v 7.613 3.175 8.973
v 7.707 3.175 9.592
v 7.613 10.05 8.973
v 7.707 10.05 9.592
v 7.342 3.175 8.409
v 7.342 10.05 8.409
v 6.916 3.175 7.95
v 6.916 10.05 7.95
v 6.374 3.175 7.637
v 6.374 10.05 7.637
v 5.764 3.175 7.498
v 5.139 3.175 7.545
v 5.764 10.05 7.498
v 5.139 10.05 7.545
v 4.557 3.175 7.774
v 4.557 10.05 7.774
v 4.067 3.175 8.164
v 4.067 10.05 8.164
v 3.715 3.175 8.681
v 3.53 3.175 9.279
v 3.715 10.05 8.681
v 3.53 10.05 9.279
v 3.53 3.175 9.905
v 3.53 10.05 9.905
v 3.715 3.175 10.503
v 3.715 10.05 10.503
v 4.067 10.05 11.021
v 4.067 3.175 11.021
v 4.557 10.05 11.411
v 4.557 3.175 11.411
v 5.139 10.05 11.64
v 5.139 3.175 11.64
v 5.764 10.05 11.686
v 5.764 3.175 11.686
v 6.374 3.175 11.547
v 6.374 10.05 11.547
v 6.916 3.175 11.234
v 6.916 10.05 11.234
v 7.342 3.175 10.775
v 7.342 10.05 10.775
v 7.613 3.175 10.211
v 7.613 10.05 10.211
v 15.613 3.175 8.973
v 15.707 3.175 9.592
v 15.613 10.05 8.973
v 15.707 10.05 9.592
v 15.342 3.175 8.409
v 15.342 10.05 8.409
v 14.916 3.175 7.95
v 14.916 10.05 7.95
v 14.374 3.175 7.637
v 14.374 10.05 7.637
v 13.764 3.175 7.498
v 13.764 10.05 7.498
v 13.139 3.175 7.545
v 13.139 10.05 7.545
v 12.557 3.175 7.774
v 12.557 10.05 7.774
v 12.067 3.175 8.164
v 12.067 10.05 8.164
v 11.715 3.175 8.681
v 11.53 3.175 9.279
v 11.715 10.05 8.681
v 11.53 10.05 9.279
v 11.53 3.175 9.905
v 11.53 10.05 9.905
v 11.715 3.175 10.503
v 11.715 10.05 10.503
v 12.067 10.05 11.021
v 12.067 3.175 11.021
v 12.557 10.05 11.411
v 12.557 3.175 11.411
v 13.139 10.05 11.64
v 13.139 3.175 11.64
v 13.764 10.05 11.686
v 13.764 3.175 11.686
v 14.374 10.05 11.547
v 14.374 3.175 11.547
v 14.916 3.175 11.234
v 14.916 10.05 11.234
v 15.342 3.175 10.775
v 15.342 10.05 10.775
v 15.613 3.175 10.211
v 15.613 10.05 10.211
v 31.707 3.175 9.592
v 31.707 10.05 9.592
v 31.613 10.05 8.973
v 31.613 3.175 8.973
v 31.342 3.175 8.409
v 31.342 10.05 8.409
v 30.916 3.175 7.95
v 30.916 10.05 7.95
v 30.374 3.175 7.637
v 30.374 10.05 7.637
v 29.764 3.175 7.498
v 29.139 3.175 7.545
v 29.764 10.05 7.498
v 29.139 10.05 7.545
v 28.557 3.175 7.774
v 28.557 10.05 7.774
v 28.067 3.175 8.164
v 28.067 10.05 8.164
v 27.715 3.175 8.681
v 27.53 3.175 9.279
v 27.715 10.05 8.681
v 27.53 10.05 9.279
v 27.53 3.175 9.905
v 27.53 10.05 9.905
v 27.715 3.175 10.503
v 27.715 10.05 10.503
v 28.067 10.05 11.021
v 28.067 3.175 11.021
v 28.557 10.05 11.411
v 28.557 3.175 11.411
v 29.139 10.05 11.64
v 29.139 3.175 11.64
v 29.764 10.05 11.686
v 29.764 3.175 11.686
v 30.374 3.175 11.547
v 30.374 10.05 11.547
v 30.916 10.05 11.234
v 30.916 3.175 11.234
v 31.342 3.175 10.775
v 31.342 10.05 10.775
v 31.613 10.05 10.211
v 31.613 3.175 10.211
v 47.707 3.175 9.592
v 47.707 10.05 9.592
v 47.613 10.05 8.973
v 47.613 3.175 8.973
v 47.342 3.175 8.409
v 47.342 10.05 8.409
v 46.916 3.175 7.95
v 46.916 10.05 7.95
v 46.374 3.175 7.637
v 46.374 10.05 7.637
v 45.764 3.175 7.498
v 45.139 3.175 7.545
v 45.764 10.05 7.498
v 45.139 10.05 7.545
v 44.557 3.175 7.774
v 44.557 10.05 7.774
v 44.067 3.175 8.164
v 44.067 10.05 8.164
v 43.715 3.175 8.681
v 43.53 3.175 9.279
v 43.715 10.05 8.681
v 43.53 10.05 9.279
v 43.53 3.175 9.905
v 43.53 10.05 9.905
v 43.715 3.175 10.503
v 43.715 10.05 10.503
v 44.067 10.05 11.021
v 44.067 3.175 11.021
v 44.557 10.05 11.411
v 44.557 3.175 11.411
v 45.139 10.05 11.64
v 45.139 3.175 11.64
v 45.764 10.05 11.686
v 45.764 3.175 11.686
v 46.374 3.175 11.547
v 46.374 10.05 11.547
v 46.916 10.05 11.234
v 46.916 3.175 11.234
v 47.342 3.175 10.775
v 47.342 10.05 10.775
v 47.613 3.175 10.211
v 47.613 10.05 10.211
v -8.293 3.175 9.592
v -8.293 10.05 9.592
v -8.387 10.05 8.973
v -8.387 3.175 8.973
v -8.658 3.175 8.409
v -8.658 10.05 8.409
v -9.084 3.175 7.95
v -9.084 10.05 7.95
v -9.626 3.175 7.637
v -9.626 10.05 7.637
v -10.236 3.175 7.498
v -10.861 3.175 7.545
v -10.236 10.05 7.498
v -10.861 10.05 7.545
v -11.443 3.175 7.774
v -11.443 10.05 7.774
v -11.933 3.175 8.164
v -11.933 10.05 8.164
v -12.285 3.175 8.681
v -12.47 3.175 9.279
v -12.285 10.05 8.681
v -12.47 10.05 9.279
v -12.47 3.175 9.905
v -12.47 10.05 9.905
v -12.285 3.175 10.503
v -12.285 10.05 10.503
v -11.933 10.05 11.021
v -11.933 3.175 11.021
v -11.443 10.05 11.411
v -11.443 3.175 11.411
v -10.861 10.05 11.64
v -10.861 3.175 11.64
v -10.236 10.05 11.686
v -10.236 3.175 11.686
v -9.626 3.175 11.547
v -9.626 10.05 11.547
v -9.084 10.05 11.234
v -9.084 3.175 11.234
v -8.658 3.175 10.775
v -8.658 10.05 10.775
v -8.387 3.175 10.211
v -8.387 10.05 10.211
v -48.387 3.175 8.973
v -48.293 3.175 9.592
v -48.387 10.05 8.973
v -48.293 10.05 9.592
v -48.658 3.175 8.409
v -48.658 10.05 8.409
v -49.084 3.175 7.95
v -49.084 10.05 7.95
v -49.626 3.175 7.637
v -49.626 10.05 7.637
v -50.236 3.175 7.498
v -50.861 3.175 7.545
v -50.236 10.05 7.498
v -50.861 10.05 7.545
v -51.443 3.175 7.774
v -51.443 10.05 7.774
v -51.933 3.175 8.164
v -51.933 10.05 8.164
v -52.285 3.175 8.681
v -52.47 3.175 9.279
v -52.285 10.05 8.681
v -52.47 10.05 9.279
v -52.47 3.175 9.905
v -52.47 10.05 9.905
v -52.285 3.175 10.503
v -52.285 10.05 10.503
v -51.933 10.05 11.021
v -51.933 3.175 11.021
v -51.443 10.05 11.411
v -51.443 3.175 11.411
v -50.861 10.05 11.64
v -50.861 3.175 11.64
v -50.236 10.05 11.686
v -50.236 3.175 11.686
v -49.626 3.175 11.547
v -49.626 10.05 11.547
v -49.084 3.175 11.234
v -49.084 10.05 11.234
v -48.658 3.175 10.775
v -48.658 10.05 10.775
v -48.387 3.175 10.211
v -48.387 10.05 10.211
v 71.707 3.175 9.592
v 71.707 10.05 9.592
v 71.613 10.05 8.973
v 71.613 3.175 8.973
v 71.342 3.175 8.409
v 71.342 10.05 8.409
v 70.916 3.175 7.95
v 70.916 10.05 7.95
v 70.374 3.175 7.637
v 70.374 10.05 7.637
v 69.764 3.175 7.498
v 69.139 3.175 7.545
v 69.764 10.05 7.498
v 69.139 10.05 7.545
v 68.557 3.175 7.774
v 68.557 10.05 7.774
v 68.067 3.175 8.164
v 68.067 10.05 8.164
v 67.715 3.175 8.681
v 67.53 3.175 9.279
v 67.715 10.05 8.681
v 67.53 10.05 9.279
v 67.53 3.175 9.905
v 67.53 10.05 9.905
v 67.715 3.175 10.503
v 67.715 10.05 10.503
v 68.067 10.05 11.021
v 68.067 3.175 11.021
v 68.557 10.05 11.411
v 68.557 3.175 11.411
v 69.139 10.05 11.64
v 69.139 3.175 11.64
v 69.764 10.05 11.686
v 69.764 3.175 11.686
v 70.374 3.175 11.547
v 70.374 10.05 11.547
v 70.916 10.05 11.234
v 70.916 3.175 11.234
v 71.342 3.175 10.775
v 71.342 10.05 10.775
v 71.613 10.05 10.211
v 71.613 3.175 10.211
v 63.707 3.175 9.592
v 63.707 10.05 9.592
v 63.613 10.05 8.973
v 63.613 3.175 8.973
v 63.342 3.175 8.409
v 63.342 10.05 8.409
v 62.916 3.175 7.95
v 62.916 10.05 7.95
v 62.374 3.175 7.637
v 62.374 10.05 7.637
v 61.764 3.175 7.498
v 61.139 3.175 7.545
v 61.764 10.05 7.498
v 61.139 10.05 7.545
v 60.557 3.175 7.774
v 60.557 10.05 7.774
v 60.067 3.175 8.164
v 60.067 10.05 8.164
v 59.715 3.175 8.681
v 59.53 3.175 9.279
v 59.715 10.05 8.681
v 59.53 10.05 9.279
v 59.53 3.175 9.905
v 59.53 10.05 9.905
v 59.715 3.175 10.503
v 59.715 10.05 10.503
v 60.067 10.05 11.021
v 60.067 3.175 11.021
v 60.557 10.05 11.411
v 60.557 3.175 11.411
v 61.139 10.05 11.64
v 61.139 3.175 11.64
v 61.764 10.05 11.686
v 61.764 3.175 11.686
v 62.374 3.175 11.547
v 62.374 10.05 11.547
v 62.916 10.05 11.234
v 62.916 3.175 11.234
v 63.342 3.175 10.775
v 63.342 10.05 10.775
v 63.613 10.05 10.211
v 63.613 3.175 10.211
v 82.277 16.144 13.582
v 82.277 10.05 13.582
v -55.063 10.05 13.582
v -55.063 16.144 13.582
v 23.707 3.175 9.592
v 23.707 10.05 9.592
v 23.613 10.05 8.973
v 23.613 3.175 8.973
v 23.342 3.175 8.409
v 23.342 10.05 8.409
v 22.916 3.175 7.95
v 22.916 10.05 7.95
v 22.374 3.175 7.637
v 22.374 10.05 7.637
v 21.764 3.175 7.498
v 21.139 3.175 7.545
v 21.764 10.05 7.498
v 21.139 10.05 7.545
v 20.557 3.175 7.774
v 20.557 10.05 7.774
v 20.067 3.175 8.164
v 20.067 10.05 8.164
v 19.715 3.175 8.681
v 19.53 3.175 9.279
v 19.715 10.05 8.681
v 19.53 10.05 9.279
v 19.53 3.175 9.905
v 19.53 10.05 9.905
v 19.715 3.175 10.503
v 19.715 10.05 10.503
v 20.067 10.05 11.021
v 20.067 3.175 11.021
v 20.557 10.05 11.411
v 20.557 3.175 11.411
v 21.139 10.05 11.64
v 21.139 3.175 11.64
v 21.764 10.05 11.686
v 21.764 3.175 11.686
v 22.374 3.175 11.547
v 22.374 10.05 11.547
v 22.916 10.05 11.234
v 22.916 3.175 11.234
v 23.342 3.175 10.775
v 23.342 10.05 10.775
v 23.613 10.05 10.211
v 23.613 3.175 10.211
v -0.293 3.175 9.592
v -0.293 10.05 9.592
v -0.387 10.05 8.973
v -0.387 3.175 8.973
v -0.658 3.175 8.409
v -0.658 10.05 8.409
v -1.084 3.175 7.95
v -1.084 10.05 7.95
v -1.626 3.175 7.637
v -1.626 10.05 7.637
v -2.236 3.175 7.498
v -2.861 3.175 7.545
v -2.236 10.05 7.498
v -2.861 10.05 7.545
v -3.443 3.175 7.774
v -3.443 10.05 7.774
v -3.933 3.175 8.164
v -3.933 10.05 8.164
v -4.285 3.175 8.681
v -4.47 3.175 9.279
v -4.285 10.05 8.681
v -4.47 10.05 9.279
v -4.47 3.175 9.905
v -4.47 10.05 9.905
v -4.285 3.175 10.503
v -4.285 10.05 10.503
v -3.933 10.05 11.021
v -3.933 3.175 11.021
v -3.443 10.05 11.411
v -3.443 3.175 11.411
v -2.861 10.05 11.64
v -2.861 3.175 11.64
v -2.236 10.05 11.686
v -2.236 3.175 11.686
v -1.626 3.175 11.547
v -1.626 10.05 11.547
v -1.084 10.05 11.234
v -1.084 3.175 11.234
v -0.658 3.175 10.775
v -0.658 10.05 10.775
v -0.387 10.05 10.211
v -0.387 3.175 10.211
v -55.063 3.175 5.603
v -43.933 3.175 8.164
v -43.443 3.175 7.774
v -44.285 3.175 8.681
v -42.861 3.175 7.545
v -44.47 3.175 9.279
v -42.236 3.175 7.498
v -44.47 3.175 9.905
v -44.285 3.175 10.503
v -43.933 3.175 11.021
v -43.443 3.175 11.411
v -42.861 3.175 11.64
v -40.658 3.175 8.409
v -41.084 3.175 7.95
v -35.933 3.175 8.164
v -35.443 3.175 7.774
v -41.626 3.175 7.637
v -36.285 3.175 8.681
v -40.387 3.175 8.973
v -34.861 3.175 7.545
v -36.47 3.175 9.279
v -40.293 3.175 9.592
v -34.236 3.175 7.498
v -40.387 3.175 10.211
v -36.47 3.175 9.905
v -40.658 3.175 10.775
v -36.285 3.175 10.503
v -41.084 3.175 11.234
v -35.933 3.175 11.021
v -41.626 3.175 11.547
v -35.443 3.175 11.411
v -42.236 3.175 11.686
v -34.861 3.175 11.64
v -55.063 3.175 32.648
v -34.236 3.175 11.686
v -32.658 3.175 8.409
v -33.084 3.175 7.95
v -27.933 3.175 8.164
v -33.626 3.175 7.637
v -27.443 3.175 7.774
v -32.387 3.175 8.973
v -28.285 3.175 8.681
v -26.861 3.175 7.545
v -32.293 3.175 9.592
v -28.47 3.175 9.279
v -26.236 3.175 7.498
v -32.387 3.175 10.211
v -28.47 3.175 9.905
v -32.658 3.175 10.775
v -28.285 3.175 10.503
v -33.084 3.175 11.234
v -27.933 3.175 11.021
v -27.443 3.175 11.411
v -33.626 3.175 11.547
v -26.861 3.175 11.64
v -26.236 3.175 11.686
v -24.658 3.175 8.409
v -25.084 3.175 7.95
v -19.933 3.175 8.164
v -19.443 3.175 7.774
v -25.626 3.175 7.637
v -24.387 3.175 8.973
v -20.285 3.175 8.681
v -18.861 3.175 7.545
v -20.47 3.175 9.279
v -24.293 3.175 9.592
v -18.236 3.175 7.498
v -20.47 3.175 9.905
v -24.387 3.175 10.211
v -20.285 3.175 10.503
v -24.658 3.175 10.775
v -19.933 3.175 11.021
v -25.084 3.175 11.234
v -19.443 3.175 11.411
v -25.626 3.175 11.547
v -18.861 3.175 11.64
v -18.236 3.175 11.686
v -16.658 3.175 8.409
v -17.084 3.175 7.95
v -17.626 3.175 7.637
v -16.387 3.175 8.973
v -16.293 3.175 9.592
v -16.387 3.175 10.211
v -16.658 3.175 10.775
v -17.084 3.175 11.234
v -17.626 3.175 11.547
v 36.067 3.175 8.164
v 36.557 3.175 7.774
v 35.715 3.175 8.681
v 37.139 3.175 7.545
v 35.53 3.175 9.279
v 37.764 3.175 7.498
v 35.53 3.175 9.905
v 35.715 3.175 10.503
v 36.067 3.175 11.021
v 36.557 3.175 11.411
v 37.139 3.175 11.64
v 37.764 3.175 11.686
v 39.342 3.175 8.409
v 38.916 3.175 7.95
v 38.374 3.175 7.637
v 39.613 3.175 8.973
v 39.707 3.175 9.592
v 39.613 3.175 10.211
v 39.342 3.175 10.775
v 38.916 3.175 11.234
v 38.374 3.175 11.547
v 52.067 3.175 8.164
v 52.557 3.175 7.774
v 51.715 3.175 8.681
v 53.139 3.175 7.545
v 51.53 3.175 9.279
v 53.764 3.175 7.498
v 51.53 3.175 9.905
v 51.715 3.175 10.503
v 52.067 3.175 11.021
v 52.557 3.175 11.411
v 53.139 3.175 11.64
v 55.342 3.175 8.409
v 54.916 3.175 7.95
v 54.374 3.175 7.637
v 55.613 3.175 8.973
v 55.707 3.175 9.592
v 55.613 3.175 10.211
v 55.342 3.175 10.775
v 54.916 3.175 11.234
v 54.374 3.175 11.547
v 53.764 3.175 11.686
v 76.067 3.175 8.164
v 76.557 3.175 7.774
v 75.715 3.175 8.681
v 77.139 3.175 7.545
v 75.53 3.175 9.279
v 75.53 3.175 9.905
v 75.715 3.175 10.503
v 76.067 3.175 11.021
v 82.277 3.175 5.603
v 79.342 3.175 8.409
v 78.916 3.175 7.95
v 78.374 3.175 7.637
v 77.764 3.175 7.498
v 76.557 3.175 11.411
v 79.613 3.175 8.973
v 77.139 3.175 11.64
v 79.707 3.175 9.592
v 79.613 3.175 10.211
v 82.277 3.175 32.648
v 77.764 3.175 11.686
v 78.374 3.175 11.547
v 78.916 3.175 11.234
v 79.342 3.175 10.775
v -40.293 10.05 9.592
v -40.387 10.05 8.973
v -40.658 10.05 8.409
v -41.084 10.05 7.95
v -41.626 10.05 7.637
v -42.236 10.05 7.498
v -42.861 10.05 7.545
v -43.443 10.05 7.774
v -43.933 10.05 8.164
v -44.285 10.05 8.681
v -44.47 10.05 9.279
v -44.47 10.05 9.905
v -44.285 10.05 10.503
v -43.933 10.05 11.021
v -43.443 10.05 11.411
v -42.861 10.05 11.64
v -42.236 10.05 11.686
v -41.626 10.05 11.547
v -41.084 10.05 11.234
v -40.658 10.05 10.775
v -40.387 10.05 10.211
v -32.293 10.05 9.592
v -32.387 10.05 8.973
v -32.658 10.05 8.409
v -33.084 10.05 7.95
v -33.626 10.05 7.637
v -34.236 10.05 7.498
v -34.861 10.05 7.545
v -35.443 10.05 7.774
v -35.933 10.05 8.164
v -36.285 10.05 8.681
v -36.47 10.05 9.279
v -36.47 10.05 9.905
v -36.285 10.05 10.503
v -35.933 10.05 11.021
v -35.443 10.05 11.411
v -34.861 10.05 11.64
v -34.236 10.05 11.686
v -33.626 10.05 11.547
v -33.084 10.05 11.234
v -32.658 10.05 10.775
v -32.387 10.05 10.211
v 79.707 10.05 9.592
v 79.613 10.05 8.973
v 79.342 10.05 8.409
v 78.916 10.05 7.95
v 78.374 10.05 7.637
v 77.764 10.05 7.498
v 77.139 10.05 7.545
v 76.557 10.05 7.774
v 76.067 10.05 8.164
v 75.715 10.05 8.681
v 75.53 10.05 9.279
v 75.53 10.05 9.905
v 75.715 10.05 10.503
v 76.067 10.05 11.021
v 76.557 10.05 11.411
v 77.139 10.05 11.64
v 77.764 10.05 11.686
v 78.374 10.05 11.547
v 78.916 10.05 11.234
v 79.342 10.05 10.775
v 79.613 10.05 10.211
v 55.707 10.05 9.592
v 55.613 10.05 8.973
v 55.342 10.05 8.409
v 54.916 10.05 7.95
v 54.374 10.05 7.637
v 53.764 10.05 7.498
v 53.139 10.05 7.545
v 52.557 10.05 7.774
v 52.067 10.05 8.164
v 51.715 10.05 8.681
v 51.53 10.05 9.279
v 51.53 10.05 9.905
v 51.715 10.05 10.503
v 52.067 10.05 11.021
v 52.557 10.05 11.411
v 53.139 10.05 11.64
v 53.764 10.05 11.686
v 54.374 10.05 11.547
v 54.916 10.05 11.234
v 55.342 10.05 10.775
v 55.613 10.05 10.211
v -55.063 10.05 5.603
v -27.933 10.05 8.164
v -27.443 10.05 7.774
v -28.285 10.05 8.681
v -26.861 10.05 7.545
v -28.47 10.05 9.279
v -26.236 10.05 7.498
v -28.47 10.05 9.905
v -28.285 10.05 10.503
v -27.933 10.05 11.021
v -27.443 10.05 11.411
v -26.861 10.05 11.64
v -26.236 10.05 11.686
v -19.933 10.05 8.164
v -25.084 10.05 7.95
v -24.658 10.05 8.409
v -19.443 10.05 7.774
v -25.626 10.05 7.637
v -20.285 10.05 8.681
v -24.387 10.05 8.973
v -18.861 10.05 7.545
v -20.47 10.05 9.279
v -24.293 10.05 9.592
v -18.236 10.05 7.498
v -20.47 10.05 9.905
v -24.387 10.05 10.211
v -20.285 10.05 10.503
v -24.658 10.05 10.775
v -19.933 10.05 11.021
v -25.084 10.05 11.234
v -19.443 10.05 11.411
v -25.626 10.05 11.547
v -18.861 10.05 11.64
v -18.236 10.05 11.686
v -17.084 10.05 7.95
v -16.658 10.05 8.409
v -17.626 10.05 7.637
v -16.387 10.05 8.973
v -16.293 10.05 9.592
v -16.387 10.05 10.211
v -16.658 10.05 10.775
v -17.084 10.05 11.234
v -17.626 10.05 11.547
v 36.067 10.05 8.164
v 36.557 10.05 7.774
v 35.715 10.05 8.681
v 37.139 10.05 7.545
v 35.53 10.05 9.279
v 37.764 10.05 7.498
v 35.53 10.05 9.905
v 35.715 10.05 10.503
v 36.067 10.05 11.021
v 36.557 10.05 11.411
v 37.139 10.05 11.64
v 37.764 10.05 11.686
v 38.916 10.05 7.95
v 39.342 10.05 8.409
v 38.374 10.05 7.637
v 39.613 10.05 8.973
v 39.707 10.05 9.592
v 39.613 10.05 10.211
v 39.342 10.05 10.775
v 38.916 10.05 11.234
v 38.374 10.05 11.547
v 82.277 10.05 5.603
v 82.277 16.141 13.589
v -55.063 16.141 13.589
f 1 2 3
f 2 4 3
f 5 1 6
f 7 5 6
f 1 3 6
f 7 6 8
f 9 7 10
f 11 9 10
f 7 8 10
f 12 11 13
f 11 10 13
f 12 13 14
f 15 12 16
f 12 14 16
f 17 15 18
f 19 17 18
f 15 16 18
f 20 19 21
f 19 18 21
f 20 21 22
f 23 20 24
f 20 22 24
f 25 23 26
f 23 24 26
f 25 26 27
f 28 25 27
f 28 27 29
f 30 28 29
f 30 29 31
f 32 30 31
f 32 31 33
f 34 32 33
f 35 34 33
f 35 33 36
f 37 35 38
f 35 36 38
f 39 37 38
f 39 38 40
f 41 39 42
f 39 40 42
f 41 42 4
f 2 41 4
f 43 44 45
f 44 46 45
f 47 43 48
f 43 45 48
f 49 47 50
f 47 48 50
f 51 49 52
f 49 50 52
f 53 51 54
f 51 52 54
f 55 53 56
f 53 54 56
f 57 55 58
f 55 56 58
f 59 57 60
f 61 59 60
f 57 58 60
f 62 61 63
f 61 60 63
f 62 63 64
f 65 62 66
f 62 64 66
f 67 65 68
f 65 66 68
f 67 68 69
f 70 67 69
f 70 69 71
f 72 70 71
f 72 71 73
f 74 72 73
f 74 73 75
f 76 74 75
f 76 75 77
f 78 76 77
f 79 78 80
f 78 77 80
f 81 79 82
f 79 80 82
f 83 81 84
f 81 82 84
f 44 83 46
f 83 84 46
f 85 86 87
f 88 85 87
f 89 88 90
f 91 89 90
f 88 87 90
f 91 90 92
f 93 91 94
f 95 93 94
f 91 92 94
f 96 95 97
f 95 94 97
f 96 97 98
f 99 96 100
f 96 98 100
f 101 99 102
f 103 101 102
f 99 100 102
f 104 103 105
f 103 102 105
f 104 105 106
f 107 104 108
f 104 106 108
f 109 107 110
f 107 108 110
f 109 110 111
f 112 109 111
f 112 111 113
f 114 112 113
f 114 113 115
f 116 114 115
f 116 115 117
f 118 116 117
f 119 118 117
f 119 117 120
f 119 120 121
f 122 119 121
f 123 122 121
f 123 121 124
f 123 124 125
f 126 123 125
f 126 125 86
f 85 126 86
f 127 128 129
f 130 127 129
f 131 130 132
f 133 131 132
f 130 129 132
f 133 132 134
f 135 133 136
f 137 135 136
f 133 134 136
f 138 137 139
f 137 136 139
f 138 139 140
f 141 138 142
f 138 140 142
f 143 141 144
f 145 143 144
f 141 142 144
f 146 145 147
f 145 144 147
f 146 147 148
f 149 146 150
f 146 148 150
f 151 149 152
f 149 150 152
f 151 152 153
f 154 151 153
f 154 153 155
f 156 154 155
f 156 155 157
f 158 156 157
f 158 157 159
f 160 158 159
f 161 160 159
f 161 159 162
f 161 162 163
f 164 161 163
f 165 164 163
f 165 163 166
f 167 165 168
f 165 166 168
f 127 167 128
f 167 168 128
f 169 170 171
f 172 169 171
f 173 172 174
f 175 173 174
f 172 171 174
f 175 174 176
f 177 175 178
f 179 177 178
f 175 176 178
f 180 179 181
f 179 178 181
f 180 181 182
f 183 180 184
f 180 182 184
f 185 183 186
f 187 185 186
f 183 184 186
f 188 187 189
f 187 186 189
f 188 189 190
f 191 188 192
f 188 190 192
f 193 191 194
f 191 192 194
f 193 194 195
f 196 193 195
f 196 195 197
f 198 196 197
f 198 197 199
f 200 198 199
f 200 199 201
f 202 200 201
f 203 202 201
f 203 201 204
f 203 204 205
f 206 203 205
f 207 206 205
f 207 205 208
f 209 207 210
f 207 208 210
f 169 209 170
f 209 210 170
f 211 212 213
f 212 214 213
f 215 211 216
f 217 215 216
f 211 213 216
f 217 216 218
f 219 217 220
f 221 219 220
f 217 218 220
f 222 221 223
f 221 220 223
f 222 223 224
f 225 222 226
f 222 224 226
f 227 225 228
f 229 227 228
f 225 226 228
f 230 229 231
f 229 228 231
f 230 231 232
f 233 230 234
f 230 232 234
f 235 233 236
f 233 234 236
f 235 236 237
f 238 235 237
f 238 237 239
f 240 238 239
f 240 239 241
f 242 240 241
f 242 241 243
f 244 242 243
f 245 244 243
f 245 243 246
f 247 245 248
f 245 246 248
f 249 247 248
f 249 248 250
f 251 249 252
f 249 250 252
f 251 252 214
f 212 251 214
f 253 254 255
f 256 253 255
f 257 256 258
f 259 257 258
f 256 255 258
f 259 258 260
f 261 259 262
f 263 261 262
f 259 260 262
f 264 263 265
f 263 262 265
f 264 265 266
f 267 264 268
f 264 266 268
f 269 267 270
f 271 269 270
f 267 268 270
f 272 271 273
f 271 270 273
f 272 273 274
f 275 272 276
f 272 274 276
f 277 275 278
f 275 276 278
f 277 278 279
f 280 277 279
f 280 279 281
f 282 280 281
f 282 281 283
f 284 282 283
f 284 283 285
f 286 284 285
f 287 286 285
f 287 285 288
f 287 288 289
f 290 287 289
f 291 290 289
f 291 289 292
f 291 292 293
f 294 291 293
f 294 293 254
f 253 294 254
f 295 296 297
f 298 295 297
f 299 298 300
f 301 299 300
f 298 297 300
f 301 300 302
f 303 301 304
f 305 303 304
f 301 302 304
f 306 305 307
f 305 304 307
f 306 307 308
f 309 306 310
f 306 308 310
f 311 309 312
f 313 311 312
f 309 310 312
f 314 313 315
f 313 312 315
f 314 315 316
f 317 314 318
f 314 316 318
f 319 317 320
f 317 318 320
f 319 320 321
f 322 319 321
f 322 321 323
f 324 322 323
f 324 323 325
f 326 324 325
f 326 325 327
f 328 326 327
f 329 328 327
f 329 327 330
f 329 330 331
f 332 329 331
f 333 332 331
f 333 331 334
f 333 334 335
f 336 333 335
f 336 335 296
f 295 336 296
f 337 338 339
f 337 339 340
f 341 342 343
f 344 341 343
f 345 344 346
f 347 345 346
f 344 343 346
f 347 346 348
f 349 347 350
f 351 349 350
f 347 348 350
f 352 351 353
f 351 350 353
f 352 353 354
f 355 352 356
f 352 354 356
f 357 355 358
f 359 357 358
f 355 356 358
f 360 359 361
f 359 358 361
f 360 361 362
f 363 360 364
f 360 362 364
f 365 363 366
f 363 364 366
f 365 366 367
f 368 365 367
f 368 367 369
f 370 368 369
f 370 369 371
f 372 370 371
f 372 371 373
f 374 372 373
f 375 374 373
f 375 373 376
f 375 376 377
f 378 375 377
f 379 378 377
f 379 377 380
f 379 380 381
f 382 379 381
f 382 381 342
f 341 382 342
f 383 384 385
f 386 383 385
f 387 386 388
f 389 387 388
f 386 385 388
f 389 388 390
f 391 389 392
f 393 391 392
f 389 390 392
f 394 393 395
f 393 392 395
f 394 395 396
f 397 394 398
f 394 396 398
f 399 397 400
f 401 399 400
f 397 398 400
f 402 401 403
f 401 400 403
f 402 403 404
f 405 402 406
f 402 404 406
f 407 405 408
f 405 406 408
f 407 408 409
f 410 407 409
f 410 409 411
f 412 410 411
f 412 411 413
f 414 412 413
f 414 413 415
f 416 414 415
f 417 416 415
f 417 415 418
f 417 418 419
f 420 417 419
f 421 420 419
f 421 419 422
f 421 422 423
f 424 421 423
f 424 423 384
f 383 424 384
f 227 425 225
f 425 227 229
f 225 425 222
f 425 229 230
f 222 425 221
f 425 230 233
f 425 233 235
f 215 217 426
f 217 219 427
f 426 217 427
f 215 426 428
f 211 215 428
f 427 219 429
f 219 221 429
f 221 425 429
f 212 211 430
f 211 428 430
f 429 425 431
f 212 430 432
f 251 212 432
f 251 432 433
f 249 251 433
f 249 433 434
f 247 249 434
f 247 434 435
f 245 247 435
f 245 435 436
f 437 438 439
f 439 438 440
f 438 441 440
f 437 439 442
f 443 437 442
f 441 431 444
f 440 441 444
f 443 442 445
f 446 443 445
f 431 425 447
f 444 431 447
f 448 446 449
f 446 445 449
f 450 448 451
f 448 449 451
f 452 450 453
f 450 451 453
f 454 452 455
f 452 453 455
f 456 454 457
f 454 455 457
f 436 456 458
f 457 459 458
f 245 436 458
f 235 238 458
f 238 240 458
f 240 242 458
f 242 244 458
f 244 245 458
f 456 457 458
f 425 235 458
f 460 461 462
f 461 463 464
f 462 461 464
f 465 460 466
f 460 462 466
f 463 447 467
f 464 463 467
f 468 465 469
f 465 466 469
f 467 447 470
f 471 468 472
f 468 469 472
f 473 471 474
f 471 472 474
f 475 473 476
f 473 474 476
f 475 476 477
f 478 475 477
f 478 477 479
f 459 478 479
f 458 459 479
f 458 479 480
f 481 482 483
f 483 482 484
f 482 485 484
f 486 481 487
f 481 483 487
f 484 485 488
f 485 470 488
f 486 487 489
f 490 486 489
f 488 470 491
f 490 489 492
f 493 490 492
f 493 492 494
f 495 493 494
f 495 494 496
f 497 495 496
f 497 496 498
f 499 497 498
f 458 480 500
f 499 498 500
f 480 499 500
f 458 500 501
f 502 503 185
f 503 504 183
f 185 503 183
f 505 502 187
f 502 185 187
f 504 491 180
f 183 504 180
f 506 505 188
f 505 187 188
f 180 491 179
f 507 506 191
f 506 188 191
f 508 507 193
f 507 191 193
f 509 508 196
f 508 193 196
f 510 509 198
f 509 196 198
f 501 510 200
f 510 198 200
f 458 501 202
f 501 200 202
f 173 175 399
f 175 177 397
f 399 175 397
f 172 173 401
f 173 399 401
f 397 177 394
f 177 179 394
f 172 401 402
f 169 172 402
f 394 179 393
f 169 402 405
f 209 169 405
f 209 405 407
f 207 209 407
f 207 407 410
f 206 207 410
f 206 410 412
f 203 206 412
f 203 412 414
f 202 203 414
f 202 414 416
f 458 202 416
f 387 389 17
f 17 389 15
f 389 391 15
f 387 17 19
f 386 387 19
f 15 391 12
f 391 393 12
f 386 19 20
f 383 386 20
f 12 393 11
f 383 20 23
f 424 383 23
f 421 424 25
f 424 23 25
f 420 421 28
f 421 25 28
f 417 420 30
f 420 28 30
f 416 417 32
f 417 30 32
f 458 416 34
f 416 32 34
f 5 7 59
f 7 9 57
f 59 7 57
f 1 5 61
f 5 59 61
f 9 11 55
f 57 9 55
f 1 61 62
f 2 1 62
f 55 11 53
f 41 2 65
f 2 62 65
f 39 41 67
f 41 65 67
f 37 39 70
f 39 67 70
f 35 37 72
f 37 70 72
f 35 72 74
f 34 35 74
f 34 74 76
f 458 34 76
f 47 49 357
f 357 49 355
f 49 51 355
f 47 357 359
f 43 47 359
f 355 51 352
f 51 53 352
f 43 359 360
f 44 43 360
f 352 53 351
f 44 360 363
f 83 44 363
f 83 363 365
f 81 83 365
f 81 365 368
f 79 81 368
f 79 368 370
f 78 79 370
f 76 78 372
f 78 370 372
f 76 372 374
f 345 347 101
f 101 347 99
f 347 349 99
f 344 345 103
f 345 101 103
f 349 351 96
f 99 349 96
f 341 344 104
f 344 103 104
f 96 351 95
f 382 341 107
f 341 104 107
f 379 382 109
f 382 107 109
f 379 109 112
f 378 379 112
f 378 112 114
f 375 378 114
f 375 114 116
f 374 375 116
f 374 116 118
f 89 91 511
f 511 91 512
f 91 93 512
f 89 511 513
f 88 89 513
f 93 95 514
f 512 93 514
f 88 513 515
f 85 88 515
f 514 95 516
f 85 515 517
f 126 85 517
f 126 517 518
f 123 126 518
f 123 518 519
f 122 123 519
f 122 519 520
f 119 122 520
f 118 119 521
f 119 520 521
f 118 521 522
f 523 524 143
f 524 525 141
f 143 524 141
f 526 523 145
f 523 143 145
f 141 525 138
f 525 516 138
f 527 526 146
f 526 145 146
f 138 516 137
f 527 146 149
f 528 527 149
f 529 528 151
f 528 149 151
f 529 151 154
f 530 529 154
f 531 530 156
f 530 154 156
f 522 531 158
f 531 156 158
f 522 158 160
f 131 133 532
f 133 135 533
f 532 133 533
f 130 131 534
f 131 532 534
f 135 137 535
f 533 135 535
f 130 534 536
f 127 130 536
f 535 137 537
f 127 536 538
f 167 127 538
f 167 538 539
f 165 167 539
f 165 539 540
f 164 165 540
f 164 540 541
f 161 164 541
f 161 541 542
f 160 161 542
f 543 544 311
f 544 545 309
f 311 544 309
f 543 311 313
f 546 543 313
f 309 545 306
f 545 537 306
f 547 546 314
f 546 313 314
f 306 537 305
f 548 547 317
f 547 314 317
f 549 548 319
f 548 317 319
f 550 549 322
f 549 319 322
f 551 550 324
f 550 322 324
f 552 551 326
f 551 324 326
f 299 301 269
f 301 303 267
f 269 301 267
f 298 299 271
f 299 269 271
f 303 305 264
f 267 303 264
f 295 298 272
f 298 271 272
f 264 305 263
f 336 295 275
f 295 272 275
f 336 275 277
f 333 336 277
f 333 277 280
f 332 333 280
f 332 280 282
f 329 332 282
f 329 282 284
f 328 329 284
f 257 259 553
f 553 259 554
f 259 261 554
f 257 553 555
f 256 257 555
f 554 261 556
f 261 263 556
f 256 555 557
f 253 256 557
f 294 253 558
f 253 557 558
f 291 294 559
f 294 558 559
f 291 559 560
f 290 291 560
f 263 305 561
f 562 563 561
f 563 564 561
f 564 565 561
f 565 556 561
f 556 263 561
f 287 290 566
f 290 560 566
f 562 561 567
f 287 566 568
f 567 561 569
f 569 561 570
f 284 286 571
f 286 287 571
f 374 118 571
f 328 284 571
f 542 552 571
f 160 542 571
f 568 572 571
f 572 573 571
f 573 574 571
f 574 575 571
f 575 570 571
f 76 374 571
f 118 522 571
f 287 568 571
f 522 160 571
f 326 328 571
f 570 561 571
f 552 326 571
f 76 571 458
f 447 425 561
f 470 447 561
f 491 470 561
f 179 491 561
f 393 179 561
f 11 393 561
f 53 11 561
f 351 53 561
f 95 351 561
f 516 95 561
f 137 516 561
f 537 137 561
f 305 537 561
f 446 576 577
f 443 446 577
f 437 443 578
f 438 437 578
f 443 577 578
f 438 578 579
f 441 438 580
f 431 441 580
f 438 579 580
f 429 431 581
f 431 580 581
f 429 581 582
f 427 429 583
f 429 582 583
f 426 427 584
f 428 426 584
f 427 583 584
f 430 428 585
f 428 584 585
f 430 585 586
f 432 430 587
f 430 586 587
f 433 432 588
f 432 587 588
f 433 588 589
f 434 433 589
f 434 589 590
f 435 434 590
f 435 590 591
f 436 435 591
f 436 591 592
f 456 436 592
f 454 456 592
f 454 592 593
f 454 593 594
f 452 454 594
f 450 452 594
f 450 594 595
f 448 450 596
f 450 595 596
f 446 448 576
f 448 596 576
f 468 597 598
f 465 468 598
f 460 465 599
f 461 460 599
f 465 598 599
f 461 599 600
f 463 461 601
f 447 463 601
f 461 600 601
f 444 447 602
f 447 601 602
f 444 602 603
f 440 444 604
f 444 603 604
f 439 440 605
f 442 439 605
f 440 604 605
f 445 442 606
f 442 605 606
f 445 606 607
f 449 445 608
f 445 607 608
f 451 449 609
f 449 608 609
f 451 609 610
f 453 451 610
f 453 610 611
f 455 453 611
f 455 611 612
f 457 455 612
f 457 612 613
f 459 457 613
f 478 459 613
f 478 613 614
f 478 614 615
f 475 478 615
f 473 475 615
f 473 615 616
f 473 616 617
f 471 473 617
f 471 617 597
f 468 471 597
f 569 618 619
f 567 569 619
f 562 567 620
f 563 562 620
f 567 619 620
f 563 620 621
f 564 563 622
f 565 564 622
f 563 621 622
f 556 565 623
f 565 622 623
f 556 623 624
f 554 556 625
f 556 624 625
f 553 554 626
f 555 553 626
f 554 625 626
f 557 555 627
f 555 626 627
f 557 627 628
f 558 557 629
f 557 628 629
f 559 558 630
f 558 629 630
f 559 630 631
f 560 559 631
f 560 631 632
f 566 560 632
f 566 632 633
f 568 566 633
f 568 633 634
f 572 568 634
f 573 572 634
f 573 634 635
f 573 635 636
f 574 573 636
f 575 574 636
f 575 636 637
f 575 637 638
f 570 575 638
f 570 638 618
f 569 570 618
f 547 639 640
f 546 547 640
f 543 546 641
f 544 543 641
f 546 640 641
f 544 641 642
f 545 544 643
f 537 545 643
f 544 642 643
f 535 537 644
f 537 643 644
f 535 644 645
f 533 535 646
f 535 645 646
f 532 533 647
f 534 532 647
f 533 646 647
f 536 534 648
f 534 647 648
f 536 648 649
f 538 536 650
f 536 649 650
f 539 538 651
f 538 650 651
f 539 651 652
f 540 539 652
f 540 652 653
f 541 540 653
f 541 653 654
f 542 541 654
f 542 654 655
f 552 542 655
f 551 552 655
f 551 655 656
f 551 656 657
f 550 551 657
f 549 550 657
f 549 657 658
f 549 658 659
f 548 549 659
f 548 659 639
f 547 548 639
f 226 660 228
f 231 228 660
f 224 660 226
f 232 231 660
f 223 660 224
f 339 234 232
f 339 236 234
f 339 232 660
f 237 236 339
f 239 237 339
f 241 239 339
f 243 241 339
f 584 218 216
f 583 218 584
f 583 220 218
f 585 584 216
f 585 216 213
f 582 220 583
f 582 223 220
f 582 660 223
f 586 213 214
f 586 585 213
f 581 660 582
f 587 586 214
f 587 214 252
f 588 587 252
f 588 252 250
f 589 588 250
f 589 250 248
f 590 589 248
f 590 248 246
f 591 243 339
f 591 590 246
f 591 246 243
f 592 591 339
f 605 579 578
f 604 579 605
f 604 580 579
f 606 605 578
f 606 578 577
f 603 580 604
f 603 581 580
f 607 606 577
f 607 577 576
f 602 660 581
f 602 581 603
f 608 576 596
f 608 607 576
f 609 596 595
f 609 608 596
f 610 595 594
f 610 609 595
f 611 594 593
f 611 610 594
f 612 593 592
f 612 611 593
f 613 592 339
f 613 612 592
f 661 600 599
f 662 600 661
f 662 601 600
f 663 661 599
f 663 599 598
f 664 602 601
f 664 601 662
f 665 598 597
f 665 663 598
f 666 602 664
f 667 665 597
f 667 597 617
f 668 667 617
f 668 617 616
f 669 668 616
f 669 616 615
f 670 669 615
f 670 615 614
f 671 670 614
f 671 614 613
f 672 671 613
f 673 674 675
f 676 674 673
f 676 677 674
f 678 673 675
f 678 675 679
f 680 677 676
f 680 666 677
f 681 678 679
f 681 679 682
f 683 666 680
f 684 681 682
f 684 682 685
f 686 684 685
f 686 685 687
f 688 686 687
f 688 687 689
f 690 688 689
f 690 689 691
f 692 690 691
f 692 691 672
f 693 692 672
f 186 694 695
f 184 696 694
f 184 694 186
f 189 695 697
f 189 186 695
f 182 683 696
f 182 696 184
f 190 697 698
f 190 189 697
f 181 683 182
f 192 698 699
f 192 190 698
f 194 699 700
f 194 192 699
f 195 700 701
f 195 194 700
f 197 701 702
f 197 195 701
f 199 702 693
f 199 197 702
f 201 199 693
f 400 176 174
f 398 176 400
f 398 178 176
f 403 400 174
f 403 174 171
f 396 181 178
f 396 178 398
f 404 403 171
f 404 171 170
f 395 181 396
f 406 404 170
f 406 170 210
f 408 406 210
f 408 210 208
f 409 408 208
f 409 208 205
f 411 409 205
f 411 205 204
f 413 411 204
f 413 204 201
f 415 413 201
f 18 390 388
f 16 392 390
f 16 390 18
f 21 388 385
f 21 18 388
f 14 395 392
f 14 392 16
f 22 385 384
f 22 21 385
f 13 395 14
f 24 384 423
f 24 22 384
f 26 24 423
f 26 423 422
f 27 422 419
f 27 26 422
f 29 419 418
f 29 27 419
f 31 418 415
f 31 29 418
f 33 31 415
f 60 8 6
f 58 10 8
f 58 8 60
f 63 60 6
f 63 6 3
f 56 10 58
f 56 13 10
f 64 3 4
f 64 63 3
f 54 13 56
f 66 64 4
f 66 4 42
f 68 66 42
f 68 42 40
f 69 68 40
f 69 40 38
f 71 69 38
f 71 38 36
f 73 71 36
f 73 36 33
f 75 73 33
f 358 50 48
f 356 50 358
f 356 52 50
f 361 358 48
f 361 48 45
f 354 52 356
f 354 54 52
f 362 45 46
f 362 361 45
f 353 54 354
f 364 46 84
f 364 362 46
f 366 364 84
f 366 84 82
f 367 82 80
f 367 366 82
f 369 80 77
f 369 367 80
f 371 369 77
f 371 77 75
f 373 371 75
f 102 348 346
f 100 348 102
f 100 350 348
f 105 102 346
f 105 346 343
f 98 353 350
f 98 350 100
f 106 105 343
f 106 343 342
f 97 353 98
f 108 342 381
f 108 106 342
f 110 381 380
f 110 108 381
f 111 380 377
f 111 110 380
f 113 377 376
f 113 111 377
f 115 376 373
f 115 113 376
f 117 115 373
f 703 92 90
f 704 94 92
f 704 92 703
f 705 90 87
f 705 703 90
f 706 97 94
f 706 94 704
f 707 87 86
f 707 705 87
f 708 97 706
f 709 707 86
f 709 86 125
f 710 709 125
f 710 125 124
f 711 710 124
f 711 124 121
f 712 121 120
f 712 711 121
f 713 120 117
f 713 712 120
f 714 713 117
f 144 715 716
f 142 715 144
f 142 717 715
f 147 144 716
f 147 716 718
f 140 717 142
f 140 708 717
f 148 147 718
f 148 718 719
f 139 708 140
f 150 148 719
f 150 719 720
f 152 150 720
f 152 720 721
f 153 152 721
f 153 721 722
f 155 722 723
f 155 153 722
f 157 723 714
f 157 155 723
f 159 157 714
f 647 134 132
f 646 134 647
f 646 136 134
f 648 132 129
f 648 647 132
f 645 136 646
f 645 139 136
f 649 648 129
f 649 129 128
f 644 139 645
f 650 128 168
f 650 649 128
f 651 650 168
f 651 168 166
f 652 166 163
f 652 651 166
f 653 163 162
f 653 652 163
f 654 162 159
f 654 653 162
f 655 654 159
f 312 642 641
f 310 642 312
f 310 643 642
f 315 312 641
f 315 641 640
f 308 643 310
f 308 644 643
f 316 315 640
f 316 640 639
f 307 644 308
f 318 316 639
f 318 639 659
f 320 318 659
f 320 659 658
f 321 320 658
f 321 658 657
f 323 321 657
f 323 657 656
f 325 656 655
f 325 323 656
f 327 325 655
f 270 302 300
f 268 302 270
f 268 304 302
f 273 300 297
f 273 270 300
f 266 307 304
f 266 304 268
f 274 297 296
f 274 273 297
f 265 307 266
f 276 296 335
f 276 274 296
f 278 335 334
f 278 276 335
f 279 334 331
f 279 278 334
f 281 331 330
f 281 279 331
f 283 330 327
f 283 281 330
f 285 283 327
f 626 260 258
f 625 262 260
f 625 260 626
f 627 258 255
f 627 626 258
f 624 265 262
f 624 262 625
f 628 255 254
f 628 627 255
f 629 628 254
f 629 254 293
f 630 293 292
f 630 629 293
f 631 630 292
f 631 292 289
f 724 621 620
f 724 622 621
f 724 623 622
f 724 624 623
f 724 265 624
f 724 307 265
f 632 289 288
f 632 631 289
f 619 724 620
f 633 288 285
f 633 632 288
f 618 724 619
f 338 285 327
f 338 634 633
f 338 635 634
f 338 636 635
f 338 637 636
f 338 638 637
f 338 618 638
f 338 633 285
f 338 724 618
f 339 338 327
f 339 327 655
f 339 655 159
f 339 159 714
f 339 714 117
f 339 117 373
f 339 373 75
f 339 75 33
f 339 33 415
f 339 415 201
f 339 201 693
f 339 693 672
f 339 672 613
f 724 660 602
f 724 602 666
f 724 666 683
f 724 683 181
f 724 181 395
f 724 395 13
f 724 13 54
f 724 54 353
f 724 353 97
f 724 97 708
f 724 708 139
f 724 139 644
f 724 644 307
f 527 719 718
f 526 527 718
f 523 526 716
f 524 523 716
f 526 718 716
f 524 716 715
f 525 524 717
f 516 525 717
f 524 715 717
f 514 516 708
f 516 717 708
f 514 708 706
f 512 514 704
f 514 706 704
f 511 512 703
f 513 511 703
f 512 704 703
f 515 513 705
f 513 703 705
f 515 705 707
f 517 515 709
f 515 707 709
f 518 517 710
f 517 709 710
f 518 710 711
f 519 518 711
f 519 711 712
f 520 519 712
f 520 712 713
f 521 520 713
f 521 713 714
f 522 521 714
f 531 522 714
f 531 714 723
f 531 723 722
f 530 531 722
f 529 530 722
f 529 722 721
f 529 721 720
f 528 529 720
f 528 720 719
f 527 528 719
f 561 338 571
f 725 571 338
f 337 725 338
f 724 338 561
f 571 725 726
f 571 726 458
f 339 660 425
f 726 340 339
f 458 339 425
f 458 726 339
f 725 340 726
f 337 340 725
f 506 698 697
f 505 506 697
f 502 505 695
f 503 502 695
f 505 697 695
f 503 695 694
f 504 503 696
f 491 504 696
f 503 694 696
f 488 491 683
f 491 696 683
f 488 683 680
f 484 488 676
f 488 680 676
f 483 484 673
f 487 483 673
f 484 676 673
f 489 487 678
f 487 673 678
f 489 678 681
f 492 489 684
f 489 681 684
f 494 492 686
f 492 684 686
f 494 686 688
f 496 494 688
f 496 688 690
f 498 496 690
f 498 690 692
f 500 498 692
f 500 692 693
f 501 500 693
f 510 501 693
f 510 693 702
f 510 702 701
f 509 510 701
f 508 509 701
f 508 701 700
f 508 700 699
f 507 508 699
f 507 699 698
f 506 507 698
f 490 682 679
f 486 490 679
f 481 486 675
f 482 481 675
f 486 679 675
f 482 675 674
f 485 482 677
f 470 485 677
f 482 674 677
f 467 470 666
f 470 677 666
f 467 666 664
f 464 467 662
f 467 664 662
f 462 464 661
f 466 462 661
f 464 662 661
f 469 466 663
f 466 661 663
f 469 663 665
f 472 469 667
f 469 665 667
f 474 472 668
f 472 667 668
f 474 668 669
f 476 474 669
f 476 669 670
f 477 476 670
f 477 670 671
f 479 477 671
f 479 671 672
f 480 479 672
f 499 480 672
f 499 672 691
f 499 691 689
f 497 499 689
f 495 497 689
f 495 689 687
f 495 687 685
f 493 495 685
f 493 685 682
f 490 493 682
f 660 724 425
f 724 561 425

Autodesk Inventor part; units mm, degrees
ref_plane "YZ Plane" through (0, 0, 0) normal (1, 0, 0) x (0, 1, 0)
sketch "Sketch1" plane through (0, 0, 0) normal (0, 1, 0) x (-1, 0, 0)
  line L0 (60.1434, 43.7027) -> (-87.3566, 43.7027)
  line L1 (-87.3566, 43.7027) -> (-87.3566, 5.6027)
  line L2 (-87.3566, 5.6027) -> (60.1434, 5.6027)
  line L3 (60.1434, 5.6027) -> (60.1434, 43.7027)
  point P0 (0, 0)
  dimension "d0" = 147.5
  dimension "d1" = 38.1
extrude "Extrusion1" add sketch "Sketch1" along normal blind 19.05
ref_plane "Work Plane1" through (87.3566, 19.05, 5.6027) normal (0, -0.9396926, -0.3420201) x (-1, 0, 0)
sketch "Sketch2" plane through (87.3566, 19.05, 5.6027) normal (0, -0.9396926, -0.3420201) x (-1, 0, 0)
  line L0 (147.5, -42.3178) -> (147.5, -35.8023) construction
  line L1 (0, -35.8023) -> (0, 0) construction
  line L2 (147.5, -40.4915) -> (0, -40.4915)
  line L3 (0, -40.4915) -> (0, 0)
  line L4 (0, 0) -> (147.5, 0)
  line L5 (147.5, 0) -> (147.5, -40.4915)
  point P0 (87.3566, -1.2507)
extrude "Extrusion2" add sketch "Sketch2" against normal blind 19.05
sketch "Sketch3" plane through (87.3566, 36.9511, 12.1182) normal (0, 0.9396926, 0.3420201) x (1, 0, 0)
  line L0 (0, -40.4915) -> (-147.5, -40.4915) construction
  line L1 (0, -6.5155) -> (0, 0) construction
  line L2 (-147.5, -40.4915) -> (0, -40.4915)
  line L3 (0, -40.4915) -> (0, 0)
  line L4 (0, 0) -> (-147.5, 0)
  line L5 (-147.5, 0) -> (-147.5, -40.4915)
  point P0 (-87.3566, -1.2507)
extrude "Extrusion3" cut sketch "Sketch3" against normal blind 19.05
ref_plane "Work Plane2" through (-79.1934, 19.05, 5.6027) normal (0, 1, 0) x (1, 0, 0)
fillet "Fillet2" radius 3.175 5 edges at (13.6066, 5.3397, 43.7027) (13.6066, 0, 43.7027) (-60.1434, 0, 24.6527) (13.6066, 0, 5.6027) (87.3566, 0, 24.6527)
fillet "Fillet3" radius 3.175 1 edges at (13.6066, 19.0479, 5.6027)
sketch "Sketch12" plane through (87.3566, 3.175, 43.7027) normal (1, 0, 0) x (0, 0, -1)
  line L0 (38.121, 6.8749) -> (30.121, 6.8749)
  line L1 (30.121, 6.8749) -> (30.121, 14.8749)
  line L2 (30.121, 14.8749) -> (38.121, 14.8749)
  line L3 (38.121, 14.8749) -> (38.121, 6.8749)
  dimension "d36" = 8
  dimension "d37" = 8
extrude "Extrusion9" cut sketch "Sketch12" against normal through all
sketch "Sketch13" plane through (87.3566, 10.0499, 13.5817) normal (0, 1, 0) x (1, 0, 0)
  line L0 (-73.75, 7.979) -> (-73.75, -0.1527)
  circle A0 centre (-73.75, 3.9895) radius 2.1
  circle A1 centre (-81.75, 3.9895) radius 2.1
  circle A2 centre (-89.75, 3.9895) radius 2.1
  circle A3 centre (-97.75, 3.9895) radius 2.1
  circle A4 centre (-105.75, 3.9895) radius 2.1
  circle A5 centre (-113.75, 3.9895) radius 2.1
  circle A6 centre (-121.75, 3.9895) radius 2.1
  circle A7 centre (-129.75, 3.9895) radius 2.1
  circle A8 centre (-137.75, 3.9895) radius 2.1
  circle A9 centre (-65.75, 3.9895) radius 2.1
  circle A10 centre (-57.75, 3.9895) radius 2.1
  circle A11 centre (-49.75, 3.9895) radius 2.1
  circle A12 centre (-41.75, 3.9895) radius 2.1
  circle A13 centre (-33.75, 3.9895) radius 2.1
  circle A14 centre (-25.75, 3.9895) radius 2.1
  circle A15 centre (-17.75, 3.9895) radius 2.1
  circle A16 centre (-9.75, 3.9895) radius 2.1
extrude "Extrusion10" cut sketch "Sketch13" against normal through all
sketch "Sketch14" plane through (87.3566, 3.175, 43.7027) normal (1, 0, 0) x (0, 0, -1)
  line L0 (-30.4844, 21.6462) -> (52.8728, 21.6462)
  line L1 (52.8728, 21.6462) -> (52.8728, -12.2101)
  line L2 (52.8728, -12.2101) -> (-30.4844, -12.2101)
  line L3 (-30.4844, -12.2101) -> (-30.4844, 21.6462)
  point P0 (43.7027, -3.175)
extrude "Extrusion11" cut sketch "Sketch14" against normal blind 5.08
sketch "Sketch15" plane through (-60.1434, 3.175, 43.7027) normal (-1, 0, 0) x (0, 0, 1)
  line L0 (33.6252, 94.5491) -> (-79.5372, 94.5491)
  line L1 (-79.5372, 94.5491) -> (-79.5372, -54.7848)
  line L2 (-79.5372, -54.7848) -> (33.6252, -54.7848)
  line L3 (33.6252, -54.7848) -> (33.6252, 94.5491)
  point P0 (-43.7027, -3.175)
extrude "Extrusion12" cut sketch "Sketch15" against normal blind 5.08
sketch "Sketch16" plane through (82.2766, 3.175, 43.7027) normal (1, 0, 0) x (0, 0, -1)
  arc A0 (34.925, -3.175) -> (38.1, 0) centre (34.925, 0) ccw construction
  line L0 (-8.1127, -3.175) -> (38.1, -3.175)
  line L1 (38.1, -3.175) -> (38.1, 0)
  line L2 (38.1, 0) -> (-8.1127, 0)
  line L3 (-8.1127, 0) -> (-8.1127, -3.175)
  line L4 (0, 1.4623) -> (0, 0) construction
  line L5 (30.121, 12.9709) -> (11.0545, 0)
  line L6 (11.2811, 0) -> (-2.3132, 0)
  line L7 (-2.3132, 0) -> (0.9299, 12.0527)
  line L8 (0.0505, 2.0261) -> (30.121, 12.9709) construction
  line L9 (0.9299, 12.0527) -> (30.121, 12.9709)
  point P0 (43.7027, -3.175)
  point P1 (0, 0.7312)
extrude "Extrusion14" cut sketch "Sketch16" against normal through all
sketch "Sketch17" plane through (82.2766, 3.175, 43.7027) normal (1, 0, 0) x (0, 0, -1)
  line L0 (30.121, 12.9709) -> (11.0545, 0) construction
  line L1 (11.0545, 0) -> (38.1, 0) construction
  line L2 (38.1, 6.8749) -> (38.1, 0) construction
  line L3 (30.121, 6.8749) -> (38.1, 6.8749) construction
  line L4 (30.121, 12.9709) -> (30.121, 6.8749) construction
  point P0 (43.7027, -3.175)
properties part number "Ramp version 1"
